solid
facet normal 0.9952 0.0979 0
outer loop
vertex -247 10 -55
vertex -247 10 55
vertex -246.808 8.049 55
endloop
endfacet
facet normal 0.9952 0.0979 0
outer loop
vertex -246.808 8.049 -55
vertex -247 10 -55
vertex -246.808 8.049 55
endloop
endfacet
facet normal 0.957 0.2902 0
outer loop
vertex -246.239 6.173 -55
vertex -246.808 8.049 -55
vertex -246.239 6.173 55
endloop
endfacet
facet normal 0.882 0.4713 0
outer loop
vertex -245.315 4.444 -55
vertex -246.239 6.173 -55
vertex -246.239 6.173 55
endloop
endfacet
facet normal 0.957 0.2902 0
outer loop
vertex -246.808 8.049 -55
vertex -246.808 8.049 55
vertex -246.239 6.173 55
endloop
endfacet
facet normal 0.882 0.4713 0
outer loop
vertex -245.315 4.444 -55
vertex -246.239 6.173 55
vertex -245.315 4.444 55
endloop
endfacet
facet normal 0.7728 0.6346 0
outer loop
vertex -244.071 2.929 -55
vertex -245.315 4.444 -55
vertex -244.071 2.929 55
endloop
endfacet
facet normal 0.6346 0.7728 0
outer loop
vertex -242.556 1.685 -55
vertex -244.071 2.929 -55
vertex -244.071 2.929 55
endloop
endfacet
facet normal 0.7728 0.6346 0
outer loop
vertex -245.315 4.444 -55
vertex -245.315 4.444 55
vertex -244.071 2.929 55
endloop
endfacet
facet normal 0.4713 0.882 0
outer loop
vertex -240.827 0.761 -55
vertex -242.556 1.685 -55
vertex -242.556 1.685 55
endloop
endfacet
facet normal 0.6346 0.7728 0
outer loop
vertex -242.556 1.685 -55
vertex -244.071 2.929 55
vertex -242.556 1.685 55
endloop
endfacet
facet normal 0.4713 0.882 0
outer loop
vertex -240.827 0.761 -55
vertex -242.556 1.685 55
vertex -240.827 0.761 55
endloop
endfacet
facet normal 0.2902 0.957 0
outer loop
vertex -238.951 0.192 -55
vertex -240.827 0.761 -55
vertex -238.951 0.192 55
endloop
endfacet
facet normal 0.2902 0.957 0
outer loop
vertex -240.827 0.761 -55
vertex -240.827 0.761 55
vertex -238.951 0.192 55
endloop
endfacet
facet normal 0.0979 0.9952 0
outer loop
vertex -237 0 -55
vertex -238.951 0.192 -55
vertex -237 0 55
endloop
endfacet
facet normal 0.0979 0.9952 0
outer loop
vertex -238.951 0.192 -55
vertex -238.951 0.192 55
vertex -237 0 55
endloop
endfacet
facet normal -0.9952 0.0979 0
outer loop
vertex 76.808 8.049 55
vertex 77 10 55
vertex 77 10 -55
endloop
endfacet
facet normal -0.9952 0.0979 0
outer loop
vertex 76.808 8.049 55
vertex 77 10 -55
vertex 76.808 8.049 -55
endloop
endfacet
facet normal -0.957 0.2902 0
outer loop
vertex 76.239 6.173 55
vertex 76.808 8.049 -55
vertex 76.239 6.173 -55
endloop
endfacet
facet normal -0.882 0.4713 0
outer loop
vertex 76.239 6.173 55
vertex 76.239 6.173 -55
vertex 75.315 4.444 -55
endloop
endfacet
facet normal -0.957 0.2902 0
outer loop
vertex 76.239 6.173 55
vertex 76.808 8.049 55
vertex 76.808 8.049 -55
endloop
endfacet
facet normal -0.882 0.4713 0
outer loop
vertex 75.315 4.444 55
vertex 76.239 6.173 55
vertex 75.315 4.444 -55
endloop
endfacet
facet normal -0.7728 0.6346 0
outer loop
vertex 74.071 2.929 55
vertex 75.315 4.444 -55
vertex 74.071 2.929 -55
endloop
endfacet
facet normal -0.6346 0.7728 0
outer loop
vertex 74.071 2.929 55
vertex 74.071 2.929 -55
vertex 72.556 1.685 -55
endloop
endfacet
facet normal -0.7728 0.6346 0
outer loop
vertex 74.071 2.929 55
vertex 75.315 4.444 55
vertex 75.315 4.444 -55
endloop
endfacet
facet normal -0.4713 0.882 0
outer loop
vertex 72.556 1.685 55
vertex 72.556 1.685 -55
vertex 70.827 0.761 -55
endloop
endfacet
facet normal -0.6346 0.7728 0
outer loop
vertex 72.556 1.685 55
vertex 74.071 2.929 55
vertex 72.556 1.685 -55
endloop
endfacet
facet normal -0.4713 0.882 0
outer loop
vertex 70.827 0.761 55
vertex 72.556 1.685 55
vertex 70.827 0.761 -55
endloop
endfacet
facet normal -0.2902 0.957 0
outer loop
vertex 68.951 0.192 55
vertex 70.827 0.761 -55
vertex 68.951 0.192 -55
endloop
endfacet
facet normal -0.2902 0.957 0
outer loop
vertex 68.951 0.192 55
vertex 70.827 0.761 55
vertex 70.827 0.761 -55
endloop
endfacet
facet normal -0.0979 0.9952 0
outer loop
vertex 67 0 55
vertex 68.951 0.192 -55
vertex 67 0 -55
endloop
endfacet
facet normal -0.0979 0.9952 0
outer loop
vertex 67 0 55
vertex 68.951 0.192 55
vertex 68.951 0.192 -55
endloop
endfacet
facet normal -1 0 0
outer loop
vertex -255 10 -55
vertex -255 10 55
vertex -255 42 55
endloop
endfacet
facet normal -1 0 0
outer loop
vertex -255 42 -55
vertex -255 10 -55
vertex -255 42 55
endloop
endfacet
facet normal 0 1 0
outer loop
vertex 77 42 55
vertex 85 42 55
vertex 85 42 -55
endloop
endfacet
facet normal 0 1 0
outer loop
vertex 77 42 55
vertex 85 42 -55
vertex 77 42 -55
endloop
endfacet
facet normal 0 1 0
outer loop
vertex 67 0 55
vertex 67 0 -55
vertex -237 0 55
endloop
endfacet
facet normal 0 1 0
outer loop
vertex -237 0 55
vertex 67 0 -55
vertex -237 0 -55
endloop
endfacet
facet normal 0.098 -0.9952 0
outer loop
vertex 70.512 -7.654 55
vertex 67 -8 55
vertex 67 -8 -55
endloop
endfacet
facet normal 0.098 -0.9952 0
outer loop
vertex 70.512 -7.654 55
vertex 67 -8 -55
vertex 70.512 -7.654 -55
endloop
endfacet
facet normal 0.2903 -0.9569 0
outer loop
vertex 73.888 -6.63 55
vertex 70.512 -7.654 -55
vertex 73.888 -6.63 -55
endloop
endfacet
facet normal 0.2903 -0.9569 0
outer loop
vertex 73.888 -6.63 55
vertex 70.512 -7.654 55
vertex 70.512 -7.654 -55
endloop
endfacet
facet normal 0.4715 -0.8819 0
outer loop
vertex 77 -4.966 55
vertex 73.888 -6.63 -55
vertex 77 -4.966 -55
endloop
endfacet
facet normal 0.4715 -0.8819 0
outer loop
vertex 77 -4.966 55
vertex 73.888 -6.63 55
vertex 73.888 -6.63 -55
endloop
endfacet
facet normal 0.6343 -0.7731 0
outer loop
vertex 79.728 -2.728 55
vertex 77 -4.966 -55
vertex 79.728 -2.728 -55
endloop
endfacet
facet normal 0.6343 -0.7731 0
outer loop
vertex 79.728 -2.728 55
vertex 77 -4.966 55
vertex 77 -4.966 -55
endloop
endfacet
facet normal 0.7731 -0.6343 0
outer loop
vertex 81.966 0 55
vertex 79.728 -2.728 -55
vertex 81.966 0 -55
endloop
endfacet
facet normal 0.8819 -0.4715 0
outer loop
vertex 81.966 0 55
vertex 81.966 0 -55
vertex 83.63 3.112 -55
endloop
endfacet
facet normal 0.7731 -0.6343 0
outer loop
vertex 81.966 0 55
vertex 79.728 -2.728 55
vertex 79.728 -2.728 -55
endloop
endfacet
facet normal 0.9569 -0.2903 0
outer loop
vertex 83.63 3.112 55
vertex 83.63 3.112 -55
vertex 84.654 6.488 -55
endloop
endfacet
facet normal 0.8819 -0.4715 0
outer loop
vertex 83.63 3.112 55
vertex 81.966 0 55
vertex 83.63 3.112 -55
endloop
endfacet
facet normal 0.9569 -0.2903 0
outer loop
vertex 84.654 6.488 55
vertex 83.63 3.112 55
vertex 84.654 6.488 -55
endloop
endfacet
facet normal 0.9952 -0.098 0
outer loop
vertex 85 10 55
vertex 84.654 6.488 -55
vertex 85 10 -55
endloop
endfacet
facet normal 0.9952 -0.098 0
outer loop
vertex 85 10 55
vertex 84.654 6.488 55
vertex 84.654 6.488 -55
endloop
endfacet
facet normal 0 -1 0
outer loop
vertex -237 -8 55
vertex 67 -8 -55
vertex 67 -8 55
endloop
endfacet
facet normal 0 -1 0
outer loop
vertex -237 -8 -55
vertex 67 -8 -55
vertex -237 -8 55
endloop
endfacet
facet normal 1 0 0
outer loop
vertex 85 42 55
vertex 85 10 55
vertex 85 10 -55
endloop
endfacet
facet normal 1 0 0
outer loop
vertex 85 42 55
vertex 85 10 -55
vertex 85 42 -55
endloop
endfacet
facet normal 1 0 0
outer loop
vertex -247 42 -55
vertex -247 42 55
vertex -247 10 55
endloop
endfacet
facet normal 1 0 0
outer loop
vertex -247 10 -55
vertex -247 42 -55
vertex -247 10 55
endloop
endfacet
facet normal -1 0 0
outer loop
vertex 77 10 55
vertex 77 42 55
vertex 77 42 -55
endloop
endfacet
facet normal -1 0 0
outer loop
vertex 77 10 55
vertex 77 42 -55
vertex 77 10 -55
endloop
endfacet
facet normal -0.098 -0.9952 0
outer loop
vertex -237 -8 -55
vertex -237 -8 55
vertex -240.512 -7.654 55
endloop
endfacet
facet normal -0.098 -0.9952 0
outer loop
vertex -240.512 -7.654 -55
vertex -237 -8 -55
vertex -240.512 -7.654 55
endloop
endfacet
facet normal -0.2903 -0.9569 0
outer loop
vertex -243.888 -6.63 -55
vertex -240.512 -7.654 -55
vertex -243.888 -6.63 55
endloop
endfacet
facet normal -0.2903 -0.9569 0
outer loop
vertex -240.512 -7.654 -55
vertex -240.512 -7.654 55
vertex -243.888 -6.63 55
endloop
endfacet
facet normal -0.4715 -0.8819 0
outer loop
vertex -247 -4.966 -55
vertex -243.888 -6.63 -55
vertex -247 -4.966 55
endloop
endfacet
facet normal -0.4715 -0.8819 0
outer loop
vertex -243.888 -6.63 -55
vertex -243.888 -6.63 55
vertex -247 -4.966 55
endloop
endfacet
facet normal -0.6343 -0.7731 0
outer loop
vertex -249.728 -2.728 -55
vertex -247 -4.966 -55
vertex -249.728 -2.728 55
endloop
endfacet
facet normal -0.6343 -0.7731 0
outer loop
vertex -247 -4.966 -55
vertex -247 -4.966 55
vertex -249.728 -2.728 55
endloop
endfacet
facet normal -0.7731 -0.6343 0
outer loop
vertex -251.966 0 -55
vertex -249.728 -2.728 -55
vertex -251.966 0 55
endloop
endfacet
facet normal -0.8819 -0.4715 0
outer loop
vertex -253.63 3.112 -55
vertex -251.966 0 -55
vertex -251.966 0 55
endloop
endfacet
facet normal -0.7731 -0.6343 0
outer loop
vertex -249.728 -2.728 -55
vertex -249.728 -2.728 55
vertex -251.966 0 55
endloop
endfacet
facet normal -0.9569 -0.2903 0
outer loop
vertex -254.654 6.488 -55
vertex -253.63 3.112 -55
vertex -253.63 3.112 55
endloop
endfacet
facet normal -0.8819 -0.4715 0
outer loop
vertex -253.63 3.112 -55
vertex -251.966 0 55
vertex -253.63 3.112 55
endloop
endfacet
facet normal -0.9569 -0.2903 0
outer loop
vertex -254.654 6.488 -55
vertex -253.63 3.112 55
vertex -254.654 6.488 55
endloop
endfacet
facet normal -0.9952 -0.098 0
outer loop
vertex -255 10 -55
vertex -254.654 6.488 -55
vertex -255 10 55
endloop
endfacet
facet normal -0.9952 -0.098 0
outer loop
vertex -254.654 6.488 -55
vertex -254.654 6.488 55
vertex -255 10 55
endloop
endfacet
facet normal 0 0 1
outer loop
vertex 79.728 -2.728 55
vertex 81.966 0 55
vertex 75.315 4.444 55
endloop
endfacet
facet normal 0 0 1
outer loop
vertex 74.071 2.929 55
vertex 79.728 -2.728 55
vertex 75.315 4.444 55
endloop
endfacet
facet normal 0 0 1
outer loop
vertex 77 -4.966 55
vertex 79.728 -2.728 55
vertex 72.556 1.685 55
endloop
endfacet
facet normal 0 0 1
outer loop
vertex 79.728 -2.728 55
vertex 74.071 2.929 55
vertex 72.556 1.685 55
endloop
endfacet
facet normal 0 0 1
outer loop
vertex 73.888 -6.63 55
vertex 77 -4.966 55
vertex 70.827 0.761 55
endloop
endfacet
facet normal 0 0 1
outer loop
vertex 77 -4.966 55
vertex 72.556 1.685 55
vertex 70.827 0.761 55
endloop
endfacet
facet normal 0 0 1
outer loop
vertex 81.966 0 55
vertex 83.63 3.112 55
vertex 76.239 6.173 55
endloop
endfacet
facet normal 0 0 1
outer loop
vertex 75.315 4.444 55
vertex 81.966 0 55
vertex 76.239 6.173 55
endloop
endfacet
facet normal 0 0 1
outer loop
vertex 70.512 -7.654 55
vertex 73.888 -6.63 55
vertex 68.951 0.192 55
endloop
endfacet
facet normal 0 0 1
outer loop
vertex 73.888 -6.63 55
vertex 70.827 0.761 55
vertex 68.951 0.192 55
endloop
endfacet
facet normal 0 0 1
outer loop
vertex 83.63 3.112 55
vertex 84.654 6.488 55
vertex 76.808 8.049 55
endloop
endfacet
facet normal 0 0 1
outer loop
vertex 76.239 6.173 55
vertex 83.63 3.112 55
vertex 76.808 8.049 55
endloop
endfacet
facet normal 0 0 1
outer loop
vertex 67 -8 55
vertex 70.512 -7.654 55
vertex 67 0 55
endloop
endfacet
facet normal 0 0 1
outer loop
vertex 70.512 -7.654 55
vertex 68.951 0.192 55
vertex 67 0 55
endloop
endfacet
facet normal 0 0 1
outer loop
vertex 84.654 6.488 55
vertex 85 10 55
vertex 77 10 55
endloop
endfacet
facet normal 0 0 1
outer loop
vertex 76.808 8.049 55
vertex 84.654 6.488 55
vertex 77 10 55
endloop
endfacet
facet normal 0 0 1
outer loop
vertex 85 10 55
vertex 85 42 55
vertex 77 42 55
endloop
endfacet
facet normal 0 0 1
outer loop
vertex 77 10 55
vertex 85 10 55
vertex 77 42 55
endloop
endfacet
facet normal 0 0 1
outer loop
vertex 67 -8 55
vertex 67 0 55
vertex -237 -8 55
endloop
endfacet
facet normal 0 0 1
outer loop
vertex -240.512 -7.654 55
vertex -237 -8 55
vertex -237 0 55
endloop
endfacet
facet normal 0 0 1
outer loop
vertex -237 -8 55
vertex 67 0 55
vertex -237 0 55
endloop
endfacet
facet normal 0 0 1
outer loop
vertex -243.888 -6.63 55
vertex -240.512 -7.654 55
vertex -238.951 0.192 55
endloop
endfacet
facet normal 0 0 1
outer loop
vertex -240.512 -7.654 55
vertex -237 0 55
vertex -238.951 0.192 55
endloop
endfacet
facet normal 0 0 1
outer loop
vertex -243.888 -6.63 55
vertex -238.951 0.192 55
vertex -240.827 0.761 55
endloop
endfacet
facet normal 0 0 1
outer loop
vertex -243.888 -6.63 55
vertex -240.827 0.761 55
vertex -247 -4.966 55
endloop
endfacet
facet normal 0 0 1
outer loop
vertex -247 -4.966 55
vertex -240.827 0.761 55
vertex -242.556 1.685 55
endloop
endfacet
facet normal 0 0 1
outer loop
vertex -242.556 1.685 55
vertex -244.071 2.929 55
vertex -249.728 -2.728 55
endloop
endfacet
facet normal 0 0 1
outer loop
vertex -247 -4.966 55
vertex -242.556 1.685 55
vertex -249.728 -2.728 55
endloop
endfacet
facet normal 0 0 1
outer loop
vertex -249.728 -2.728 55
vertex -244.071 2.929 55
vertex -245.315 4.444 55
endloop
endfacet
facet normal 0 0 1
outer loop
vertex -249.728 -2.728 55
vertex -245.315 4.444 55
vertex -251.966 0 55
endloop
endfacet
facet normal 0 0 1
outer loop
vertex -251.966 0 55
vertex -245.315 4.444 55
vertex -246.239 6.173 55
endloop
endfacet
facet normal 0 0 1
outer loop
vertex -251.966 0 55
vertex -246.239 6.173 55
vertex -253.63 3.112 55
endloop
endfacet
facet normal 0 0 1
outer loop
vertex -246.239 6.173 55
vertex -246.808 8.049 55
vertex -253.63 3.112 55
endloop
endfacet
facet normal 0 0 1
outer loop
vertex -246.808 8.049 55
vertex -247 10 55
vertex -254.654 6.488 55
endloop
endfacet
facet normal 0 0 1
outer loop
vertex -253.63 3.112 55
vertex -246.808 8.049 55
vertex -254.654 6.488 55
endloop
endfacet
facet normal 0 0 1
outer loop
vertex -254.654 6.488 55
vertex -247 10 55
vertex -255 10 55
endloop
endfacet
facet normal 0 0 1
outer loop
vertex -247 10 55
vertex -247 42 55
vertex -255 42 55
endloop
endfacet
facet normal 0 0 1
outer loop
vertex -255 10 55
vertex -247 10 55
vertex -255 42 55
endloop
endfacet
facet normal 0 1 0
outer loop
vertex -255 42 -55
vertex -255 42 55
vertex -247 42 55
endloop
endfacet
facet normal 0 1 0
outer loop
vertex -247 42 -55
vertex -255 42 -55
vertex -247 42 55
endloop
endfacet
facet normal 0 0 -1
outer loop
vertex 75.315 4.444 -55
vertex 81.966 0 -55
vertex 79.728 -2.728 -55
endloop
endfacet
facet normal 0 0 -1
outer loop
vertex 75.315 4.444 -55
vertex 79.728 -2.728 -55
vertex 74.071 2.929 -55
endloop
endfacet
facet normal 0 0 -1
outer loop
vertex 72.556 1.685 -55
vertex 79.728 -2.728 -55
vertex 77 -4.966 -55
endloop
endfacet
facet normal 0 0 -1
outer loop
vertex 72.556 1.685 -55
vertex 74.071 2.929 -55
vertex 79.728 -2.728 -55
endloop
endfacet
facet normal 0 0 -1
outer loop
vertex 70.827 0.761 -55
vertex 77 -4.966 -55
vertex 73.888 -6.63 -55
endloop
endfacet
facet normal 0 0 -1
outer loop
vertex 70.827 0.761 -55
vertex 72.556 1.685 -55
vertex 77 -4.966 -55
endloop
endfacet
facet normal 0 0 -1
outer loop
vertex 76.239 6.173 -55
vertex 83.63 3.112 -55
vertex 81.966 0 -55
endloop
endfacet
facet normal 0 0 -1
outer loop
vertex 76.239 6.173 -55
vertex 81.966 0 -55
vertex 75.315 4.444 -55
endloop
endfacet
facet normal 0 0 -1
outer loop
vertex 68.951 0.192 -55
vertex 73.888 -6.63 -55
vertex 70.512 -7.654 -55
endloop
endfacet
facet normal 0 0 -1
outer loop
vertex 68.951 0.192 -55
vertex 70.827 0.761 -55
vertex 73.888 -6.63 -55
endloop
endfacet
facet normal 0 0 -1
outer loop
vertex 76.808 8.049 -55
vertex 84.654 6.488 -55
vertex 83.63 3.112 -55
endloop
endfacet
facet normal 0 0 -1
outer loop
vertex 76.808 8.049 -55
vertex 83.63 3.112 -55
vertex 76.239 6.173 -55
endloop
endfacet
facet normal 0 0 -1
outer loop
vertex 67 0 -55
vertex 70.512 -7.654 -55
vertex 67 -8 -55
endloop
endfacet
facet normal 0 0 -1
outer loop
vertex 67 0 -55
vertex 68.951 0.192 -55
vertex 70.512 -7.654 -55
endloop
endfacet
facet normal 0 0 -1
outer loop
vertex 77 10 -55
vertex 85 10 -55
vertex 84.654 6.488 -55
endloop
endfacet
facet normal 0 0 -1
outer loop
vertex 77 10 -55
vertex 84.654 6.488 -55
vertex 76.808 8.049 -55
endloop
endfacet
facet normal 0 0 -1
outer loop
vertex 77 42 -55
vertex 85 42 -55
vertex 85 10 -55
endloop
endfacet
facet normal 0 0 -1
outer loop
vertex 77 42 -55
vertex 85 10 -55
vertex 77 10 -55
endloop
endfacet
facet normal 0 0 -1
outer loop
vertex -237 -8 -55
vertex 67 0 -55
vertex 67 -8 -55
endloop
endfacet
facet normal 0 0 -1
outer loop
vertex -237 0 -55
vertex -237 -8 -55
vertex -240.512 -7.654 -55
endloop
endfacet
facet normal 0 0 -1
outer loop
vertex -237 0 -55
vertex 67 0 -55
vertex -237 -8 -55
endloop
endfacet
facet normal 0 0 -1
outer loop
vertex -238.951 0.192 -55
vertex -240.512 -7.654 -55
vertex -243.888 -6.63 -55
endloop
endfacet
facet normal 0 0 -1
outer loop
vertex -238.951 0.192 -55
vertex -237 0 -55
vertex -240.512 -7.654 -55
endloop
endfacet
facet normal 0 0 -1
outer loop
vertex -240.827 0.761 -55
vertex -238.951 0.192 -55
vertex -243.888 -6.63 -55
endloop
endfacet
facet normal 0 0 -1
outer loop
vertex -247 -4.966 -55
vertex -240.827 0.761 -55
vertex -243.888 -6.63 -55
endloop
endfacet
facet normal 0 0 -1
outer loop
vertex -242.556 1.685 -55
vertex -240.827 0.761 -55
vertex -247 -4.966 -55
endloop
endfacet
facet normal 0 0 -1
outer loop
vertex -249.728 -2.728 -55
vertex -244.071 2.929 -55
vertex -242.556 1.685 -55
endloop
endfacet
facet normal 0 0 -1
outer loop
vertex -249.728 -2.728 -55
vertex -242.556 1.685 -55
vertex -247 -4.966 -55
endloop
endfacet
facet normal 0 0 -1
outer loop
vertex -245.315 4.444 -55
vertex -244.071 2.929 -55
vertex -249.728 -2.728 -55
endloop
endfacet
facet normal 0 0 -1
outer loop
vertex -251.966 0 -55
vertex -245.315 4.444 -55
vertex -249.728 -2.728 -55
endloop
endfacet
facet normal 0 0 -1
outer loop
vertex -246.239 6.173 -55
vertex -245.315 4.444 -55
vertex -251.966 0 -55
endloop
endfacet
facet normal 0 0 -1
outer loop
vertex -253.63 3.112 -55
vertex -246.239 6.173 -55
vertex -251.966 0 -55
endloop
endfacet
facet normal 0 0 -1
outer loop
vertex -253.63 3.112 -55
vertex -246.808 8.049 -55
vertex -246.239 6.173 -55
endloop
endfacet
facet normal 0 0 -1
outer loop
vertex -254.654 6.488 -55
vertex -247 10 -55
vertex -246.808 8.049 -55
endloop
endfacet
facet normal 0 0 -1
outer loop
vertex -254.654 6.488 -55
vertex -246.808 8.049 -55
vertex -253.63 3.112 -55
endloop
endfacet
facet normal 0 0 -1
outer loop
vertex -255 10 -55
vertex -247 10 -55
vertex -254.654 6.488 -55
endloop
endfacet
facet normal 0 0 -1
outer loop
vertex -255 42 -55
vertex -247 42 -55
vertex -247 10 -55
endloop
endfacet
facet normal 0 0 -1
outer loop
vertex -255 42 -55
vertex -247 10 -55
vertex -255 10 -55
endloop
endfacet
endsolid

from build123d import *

# Parameters (mm, degrees)
SKETCH2_W                    = 170
SKETCH2_H                    = 110
BASE_FLANGE1_DEPTH           = 8
EDGE_FLANGE1_STRIP_W         = 52
EDGE_FLANGE1_STRIP_H         = 8
EDGE_FLANGE1_STRIP_CUT_DEPTH = 110
EDGE_FLANGE1_DEPTH           = 110


# Sheet-metal steps are written as plain solids
with BuildPart() as part:
    # Sketch2 → Base-Flange1 (new body)
    with BuildSketch(Plane(origin=(0, 0, 0), x_dir=(1, 0, 0), z_dir=(0, 1, 0))):
        Rectangle(SKETCH2_W, SKETCH2_H)
    extrude(amount=-BASE_FLANGE1_DEPTH)

    # Edge-Flange1 strip (across the edge) → Edge-Flange1 strip cut (cut)
    with BuildSketch(Plane(origin=(85, 0, 55), x_dir=(-1, 0, 0), z_dir=(0, 0, -1))):
        with Locations((-8, -4)):
            Rectangle(EDGE_FLANGE1_STRIP_W, EDGE_FLANGE1_STRIP_H)
    extrude(amount=EDGE_FLANGE1_STRIP_CUT_DEPTH, mode=Mode.SUBTRACT)

    # Edge-Flange1 section (across the edge) → Edge-Flange1 (add)
    with BuildSketch(Plane(origin=(85, 0, 55), x_dir=(-1, 0, 0), z_dir=(0, 0, -1))):
        with BuildLine():
            Line((0, 10), (0, 42))
            Line((0, 42), (8, 42))
            Line((8, 42), (8, 10))
            ThreePointArc((8, 10), (10.928932188, 2.928932188), (18, 0))
            Line((18, 0), (18, -8))
            ThreePointArc((18, -8), (5.272077939, -2.727922061), (0, 10))
        make_face()
    extrude(amount=EDGE_FLANGE1_DEPTH)

    # Mirror1: part across plane


with BuildPart() as part_1:
    add(part.part)
    add(part.part.mirror(Plane(origin=(-85, -8, 55), x_dir=(0, 0, 1), z_dir=(-1, 0, 0))))


solid = part_1.part
